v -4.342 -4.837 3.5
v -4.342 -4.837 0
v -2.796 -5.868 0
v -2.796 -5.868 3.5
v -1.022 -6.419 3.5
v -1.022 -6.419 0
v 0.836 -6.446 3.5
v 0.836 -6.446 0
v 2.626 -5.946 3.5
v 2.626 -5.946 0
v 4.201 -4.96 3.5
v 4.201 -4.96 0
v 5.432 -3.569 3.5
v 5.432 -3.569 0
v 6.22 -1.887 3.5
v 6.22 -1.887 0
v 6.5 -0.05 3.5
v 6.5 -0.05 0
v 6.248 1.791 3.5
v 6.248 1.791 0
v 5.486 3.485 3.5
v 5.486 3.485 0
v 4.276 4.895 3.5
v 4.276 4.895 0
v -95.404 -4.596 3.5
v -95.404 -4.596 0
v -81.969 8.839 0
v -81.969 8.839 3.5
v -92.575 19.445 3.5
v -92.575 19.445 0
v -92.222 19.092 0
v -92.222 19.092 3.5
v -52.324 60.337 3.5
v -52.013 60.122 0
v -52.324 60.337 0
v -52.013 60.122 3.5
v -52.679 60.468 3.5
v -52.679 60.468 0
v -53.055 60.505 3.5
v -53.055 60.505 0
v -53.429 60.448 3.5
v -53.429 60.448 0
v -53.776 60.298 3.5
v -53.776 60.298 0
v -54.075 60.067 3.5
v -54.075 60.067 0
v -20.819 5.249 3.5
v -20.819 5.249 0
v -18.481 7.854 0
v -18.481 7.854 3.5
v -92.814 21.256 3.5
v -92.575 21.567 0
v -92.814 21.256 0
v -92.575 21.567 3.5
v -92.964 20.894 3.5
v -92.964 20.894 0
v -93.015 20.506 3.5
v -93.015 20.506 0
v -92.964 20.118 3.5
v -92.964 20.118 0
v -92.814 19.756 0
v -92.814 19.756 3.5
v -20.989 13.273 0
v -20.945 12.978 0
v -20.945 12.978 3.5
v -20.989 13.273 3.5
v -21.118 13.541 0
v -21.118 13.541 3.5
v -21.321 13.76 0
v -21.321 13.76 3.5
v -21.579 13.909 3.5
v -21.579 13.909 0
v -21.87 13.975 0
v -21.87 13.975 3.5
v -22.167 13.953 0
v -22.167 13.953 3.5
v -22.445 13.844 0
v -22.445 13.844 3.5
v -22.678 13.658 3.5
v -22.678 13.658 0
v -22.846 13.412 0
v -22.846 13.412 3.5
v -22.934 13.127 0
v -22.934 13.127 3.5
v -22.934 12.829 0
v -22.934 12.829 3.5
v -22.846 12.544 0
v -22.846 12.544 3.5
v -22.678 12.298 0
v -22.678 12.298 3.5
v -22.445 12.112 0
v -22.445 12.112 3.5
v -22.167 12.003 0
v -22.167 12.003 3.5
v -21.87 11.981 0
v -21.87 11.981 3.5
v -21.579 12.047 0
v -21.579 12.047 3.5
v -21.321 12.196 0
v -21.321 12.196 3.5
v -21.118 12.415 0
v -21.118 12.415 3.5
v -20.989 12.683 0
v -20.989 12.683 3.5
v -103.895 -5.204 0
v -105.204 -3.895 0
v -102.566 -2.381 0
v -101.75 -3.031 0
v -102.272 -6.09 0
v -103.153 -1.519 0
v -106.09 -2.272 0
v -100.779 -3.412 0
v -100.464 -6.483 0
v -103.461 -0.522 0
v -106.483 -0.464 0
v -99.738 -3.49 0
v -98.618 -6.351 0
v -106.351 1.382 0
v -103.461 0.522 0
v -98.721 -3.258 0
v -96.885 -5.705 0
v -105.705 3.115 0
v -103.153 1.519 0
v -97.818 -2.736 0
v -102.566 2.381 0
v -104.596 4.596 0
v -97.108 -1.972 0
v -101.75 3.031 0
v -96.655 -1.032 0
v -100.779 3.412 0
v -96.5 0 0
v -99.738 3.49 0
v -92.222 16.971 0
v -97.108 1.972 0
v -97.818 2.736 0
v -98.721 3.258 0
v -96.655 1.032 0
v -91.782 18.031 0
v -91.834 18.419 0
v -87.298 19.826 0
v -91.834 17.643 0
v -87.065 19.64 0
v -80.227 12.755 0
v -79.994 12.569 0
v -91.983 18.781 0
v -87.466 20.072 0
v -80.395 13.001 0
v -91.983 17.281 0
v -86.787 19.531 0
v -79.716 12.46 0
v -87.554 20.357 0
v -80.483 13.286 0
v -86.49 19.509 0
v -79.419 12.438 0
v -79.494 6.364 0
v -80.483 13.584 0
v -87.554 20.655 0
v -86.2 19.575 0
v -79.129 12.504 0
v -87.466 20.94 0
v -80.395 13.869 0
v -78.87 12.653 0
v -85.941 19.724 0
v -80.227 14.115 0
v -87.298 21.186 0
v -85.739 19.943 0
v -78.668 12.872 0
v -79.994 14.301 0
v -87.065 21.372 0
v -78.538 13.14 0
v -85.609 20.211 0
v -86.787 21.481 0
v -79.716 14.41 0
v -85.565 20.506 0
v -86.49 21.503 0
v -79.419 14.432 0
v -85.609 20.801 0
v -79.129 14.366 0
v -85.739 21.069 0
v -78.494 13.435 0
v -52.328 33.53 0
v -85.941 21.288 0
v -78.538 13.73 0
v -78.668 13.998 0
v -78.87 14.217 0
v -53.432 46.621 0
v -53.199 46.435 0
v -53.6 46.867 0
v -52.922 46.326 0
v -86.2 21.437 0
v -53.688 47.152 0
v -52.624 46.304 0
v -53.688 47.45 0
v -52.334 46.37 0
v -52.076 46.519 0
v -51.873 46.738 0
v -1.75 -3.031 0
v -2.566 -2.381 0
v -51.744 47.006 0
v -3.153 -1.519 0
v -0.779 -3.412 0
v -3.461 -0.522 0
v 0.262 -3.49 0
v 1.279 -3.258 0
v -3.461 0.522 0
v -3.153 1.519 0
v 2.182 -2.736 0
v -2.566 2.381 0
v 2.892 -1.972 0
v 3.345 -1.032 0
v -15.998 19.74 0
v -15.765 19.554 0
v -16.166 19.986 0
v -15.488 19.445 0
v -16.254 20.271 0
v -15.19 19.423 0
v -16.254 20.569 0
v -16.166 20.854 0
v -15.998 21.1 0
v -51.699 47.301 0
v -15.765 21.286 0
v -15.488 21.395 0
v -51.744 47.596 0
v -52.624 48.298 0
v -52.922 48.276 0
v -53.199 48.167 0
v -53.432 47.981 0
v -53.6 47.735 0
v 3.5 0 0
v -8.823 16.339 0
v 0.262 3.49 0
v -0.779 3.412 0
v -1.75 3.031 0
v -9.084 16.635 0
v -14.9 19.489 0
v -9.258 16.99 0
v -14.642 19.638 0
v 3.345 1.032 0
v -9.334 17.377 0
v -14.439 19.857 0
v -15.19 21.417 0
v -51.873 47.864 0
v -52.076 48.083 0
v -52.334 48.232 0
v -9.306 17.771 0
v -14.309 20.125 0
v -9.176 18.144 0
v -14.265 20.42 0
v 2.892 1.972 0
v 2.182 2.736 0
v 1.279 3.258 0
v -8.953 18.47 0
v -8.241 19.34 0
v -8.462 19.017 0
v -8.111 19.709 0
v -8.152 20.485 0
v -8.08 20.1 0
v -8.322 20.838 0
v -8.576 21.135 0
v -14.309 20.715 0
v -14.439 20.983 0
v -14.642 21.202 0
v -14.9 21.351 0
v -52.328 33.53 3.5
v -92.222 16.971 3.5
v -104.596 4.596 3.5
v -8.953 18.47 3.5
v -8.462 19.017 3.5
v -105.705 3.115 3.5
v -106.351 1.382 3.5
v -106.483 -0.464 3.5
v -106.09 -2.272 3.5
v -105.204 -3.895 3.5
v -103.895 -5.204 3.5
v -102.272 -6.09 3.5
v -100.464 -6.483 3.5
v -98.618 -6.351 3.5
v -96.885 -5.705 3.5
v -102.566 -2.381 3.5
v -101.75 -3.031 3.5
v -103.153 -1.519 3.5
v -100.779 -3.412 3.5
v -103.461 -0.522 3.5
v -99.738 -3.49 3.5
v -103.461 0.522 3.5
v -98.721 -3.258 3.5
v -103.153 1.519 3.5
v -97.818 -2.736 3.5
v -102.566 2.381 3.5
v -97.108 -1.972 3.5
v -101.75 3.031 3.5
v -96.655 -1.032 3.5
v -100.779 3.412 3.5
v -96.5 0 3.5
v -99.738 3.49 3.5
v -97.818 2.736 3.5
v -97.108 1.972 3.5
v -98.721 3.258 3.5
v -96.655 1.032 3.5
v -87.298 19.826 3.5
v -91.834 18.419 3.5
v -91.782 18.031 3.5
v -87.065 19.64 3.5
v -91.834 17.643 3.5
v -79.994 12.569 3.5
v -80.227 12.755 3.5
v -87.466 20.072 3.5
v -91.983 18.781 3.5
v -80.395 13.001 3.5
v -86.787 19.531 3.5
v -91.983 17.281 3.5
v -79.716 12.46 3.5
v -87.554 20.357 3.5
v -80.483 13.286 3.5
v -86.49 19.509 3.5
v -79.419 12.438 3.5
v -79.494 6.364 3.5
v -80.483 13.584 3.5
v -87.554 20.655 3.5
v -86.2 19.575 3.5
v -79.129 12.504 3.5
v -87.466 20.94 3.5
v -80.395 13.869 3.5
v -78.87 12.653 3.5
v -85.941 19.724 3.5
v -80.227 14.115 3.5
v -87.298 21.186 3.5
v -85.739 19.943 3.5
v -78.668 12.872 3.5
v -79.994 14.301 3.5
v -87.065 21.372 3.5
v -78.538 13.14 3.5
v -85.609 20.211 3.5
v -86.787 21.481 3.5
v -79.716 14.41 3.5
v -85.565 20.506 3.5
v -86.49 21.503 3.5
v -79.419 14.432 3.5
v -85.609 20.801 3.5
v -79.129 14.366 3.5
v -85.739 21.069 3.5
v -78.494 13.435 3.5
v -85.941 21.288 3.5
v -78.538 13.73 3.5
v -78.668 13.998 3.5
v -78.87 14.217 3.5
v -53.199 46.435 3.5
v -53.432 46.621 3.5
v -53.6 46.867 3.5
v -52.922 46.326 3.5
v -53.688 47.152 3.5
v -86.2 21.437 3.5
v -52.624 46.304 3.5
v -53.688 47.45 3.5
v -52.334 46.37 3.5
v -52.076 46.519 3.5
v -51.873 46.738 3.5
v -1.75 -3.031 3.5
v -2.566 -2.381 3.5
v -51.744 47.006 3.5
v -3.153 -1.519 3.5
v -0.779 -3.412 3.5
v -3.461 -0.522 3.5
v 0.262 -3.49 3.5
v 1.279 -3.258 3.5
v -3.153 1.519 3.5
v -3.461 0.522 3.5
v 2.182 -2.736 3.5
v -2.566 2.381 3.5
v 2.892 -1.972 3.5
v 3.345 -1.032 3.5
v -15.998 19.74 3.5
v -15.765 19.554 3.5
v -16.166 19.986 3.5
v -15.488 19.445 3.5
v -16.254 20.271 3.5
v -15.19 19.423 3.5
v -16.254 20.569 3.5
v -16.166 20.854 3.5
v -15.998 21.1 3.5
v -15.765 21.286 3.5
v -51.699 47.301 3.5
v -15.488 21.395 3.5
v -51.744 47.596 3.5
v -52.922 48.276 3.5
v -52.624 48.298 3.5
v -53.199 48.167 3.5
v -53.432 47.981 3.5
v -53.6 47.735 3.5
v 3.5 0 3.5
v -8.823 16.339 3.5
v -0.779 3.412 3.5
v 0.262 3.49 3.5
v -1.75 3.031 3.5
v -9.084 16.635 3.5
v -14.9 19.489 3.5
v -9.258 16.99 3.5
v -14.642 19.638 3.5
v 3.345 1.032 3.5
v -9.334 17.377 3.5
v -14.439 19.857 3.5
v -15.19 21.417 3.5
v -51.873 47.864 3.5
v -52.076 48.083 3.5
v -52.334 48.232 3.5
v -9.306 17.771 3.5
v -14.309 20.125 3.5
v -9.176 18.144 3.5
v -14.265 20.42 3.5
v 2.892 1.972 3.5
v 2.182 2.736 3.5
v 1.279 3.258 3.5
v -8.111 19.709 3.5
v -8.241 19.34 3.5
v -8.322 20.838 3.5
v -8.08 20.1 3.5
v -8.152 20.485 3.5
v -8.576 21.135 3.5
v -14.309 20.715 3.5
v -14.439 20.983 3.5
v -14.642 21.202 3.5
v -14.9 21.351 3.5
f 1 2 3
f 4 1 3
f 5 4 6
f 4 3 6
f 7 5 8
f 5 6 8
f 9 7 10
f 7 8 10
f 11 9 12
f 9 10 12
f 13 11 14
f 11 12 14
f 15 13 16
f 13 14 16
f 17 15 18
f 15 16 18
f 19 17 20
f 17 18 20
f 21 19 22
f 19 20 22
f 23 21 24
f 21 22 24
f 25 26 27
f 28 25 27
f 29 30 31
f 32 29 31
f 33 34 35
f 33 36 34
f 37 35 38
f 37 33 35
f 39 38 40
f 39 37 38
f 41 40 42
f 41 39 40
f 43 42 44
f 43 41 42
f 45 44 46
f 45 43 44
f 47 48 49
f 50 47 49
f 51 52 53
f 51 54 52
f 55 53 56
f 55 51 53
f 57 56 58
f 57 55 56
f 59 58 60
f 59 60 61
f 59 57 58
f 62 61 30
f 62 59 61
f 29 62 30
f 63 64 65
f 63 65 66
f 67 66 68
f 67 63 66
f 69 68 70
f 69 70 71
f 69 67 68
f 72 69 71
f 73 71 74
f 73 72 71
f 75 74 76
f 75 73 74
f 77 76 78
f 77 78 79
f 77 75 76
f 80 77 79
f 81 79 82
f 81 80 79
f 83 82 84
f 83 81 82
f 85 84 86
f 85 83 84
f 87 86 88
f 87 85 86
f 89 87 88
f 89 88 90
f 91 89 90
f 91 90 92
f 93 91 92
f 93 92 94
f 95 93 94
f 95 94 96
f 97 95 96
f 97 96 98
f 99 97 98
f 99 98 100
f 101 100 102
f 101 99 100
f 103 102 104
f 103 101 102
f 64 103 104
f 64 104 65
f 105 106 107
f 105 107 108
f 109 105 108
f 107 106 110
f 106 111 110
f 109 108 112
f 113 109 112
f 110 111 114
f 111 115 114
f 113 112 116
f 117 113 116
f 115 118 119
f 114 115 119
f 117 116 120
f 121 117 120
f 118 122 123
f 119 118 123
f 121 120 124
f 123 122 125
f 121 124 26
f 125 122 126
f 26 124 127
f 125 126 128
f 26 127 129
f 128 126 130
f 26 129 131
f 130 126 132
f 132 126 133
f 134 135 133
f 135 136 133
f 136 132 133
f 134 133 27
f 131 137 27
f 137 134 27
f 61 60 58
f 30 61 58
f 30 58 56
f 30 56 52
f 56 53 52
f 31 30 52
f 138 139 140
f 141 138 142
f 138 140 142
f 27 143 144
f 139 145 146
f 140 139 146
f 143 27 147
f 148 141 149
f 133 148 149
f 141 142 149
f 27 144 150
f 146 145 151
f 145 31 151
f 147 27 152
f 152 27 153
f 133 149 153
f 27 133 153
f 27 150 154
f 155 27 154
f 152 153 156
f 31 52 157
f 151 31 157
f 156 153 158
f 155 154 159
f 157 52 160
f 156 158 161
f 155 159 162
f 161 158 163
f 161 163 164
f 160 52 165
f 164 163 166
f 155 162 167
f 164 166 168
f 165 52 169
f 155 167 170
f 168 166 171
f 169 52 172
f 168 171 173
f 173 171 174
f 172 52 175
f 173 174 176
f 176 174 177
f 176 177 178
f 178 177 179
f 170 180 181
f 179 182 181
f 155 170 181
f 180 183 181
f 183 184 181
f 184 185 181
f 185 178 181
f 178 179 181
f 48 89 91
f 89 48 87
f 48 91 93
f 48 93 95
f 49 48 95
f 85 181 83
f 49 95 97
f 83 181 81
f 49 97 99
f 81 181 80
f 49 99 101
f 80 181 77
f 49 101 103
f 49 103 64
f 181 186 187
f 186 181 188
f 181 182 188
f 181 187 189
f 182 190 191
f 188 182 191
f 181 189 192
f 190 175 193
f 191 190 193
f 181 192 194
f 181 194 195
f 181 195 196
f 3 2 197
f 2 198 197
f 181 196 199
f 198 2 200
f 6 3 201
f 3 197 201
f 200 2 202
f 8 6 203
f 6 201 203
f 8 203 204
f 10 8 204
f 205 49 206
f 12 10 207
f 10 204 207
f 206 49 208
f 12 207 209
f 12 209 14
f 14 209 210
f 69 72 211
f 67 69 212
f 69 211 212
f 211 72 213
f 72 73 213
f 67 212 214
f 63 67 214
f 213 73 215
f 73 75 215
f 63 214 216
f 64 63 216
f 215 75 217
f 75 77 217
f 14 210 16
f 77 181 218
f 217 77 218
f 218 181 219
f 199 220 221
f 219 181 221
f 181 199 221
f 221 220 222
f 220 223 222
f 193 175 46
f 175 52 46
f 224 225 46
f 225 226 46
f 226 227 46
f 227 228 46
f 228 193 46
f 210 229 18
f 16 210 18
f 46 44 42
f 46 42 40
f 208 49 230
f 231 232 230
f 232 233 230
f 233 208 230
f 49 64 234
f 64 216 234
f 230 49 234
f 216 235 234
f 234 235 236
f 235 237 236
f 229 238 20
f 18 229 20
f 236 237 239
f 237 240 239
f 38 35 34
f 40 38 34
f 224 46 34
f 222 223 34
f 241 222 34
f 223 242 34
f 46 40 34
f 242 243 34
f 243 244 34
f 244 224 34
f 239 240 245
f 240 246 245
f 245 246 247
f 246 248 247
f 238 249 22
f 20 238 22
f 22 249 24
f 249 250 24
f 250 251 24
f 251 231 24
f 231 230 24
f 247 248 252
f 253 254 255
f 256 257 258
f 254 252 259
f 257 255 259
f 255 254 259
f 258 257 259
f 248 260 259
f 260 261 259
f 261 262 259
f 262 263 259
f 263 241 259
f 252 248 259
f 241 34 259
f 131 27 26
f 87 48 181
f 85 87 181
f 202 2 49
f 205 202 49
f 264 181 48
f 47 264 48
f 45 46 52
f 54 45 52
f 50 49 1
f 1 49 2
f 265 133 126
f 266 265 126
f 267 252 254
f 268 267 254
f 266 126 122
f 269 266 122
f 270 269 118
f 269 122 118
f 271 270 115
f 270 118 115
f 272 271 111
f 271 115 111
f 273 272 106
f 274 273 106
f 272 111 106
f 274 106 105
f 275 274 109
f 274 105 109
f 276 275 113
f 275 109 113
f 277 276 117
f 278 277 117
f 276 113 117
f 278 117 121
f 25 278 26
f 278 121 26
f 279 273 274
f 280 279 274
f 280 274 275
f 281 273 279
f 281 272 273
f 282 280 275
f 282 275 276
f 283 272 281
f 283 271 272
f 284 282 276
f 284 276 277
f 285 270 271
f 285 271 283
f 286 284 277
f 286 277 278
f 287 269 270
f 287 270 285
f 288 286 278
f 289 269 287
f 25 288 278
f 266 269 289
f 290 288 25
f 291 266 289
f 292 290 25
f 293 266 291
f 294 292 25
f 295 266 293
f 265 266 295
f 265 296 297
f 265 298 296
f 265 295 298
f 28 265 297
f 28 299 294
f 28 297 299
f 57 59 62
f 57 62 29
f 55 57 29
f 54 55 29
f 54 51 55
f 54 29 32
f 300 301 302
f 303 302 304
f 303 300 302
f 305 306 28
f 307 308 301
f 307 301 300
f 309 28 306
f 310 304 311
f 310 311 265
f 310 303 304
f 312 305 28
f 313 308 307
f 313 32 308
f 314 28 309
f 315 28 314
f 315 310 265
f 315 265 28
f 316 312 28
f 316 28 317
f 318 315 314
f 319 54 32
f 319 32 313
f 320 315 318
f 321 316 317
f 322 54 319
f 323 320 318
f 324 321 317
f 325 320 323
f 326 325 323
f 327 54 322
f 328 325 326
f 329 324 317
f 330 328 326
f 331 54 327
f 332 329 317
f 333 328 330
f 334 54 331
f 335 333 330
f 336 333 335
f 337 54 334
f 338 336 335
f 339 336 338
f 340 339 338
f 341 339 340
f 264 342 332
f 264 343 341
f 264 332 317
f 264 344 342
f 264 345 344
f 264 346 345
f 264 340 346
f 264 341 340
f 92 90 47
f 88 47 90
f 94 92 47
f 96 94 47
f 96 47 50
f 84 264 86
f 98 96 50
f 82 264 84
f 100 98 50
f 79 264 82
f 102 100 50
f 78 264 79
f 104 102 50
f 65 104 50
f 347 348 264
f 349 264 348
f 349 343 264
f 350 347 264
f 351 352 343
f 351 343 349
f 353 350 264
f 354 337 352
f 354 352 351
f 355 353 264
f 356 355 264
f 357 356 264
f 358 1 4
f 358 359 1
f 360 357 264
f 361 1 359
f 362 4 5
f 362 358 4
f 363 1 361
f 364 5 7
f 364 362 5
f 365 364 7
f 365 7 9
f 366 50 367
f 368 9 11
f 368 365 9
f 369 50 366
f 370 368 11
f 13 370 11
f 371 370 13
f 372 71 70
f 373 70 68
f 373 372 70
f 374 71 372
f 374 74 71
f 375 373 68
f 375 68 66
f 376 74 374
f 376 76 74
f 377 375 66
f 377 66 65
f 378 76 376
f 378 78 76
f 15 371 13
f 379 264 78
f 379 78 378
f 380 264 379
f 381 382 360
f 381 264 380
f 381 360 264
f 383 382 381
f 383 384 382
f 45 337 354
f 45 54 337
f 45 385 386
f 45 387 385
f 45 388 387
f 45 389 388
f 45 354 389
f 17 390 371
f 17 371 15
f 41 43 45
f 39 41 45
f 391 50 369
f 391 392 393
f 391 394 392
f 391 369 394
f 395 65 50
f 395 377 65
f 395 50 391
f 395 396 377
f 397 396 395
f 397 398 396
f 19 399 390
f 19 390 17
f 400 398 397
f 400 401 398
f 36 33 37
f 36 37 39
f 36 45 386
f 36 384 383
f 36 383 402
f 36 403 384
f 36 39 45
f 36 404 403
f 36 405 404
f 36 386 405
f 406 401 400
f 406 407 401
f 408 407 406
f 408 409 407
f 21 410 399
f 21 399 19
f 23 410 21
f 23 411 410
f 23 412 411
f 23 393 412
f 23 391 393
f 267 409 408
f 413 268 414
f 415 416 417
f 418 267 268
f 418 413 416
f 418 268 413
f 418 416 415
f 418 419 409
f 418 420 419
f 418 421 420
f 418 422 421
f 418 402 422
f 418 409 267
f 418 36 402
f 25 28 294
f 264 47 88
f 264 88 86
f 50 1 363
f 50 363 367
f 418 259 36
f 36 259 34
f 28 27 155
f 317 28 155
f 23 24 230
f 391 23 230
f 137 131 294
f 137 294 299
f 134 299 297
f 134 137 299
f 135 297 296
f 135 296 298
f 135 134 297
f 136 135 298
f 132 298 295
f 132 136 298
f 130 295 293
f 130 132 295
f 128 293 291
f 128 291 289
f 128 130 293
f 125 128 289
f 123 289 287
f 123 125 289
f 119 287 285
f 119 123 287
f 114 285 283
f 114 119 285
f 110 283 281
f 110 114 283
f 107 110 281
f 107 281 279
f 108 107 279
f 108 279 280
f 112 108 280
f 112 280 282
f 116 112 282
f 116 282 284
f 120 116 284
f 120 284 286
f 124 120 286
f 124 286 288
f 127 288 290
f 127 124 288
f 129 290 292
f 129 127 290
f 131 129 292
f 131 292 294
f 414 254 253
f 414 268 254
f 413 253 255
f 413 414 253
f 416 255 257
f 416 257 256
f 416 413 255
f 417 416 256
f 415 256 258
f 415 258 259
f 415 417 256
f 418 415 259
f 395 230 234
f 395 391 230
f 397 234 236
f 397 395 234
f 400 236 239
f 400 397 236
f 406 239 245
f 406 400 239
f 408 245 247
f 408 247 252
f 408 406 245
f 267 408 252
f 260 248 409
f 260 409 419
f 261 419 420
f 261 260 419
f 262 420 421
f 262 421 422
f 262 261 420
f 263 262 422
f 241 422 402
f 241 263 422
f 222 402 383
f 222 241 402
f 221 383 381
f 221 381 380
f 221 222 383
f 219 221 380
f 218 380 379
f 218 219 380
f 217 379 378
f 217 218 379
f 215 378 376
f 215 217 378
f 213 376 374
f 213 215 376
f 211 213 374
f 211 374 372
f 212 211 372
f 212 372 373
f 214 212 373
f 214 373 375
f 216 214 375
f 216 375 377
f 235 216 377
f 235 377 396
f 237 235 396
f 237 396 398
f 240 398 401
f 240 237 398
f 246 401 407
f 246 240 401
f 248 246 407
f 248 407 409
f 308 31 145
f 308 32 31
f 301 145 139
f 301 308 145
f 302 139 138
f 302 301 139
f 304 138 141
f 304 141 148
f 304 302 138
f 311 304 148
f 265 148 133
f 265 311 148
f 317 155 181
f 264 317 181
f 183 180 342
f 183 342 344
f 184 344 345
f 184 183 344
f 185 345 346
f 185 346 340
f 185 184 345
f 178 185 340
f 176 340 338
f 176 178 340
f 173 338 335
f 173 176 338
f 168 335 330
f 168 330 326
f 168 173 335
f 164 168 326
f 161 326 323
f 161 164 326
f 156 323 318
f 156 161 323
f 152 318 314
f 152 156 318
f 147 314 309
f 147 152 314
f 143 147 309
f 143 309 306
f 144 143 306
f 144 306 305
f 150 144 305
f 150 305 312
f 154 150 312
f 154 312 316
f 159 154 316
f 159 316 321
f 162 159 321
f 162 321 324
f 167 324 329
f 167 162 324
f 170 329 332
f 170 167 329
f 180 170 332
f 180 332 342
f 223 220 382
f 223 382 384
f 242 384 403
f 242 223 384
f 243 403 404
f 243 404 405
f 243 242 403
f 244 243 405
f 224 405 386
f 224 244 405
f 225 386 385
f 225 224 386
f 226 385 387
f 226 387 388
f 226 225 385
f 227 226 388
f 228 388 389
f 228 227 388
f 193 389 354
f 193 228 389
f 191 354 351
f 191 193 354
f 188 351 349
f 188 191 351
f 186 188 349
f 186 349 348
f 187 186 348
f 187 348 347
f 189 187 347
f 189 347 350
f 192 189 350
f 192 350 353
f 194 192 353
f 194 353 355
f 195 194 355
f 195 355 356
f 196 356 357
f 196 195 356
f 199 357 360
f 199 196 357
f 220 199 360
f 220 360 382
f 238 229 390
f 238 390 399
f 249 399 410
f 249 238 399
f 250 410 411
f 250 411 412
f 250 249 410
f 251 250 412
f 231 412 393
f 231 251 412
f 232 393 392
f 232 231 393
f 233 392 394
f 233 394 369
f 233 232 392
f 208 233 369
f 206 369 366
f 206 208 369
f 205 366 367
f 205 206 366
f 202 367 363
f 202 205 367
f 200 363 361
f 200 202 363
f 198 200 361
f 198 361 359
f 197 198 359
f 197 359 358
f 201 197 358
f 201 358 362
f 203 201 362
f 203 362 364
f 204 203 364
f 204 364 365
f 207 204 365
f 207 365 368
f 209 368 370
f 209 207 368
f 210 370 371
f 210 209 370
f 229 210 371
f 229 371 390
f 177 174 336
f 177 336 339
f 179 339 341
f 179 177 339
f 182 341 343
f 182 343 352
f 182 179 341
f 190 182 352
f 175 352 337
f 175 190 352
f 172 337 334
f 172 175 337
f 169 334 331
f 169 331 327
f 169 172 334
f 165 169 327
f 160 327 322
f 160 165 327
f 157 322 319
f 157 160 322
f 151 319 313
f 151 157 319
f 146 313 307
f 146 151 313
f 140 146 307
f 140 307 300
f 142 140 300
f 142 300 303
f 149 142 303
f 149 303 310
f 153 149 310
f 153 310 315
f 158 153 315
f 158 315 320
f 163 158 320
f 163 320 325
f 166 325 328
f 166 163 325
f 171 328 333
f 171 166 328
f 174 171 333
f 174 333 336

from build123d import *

# Parameters (mm, degrees)
SKETCH6_R           = 1
SKETCH6_R_2         = 3.5
BOSS_EXTRUDE2_DEPTH = 3.5
FILLET1_R           = 1.5


with BuildPart() as part:
    # Sketch6 → Boss-Extrude2 (new body)
    with BuildSketch(Plane.XY):
        with BuildLine():
            Line((-18.481457554, 7.854026145), (-4.341757745, -4.837265724))
            ThreePointArc((-4.341757745, -4.837265724), (4.866357239, -4.309126039), (4.276299413, 4.895228629))
            Line((4.276299413, 4.895228629), (-9.968273897, 17.338786449))
            Line((-9.968273897, 17.338786449), (-7.460072509, 20.133239137))
            Line((-7.460072509, 20.133239137), (-53.070551784, 61.07158384))
            Line((-53.070551784, 61.07158384), (-93.636038969, 20.506096654))
            Line((-93.636038969, 20.506096654), (-91.161165235, 18.03122292))
            Line((-91.161165235, 18.03122292), (-104.596194078, 4.596194078))
            ThreePointArc((-104.596194078, 4.596194078), (-104.596194078, -4.596194078), (-95.403805922, -4.596194078))
            Line((-95.403805922, -4.596194078), (-81.96877708, 8.838834765))
            Line((-81.96877708, 8.838834765), (-79.493903346, 6.363961031))
            Line((-79.493903346, 6.363961031), (-52.327712868, 33.530151508))
            Line((-52.327712868, 33.530151508), (-20.819327109, 5.249344602))
            Line((-20.819327109, 5.249344602), (-18.481457554, 7.854026145))
        make_face()
        with Locations((-52.699132326, 47.300867674)):
            Circle(SKETCH6_R, mode=Mode.SUBTRACT)
        Circle(SKETCH6_R_2, mode=Mode.SUBTRACT)
        with Locations((-100, 0)):
            Circle(SKETCH6_R_2, mode=Mode.SUBTRACT)
        with Locations((-86.564971157, 20.506096654)):
            Circle(SKETCH6_R, mode=Mode.SUBTRACT)
        with Locations((-15.26505452, 20.420041883)):
            Circle(SKETCH6_R, mode=Mode.SUBTRACT)
        with Locations((-21.944681819, 12.978094615)):
            Circle(SKETCH6_R, mode=Mode.SUBTRACT)
        with Locations((-79.493903346, 13.435028843)):
            Circle(SKETCH6_R, mode=Mode.SUBTRACT)
    extrude(amount=BOSS_EXTRUDE2_DEPTH)

    # Fillet1
    fillet1_edges = [part.edges().sort_by_distance(p)[0] for p in [
        (-91.161165235, 18.03122292, 1.75),
        (-93.636038969, 20.506096654, 1.75),
        (-53.070551784, 61.07158384, 1.75),
        (-7.460072509, 20.133239137, 1.75),
        (-9.968273897, 17.338786449, 1.75),
    ]]
    fillet(fillet1_edges, radius=FILLET1_R)


solid = part.part
